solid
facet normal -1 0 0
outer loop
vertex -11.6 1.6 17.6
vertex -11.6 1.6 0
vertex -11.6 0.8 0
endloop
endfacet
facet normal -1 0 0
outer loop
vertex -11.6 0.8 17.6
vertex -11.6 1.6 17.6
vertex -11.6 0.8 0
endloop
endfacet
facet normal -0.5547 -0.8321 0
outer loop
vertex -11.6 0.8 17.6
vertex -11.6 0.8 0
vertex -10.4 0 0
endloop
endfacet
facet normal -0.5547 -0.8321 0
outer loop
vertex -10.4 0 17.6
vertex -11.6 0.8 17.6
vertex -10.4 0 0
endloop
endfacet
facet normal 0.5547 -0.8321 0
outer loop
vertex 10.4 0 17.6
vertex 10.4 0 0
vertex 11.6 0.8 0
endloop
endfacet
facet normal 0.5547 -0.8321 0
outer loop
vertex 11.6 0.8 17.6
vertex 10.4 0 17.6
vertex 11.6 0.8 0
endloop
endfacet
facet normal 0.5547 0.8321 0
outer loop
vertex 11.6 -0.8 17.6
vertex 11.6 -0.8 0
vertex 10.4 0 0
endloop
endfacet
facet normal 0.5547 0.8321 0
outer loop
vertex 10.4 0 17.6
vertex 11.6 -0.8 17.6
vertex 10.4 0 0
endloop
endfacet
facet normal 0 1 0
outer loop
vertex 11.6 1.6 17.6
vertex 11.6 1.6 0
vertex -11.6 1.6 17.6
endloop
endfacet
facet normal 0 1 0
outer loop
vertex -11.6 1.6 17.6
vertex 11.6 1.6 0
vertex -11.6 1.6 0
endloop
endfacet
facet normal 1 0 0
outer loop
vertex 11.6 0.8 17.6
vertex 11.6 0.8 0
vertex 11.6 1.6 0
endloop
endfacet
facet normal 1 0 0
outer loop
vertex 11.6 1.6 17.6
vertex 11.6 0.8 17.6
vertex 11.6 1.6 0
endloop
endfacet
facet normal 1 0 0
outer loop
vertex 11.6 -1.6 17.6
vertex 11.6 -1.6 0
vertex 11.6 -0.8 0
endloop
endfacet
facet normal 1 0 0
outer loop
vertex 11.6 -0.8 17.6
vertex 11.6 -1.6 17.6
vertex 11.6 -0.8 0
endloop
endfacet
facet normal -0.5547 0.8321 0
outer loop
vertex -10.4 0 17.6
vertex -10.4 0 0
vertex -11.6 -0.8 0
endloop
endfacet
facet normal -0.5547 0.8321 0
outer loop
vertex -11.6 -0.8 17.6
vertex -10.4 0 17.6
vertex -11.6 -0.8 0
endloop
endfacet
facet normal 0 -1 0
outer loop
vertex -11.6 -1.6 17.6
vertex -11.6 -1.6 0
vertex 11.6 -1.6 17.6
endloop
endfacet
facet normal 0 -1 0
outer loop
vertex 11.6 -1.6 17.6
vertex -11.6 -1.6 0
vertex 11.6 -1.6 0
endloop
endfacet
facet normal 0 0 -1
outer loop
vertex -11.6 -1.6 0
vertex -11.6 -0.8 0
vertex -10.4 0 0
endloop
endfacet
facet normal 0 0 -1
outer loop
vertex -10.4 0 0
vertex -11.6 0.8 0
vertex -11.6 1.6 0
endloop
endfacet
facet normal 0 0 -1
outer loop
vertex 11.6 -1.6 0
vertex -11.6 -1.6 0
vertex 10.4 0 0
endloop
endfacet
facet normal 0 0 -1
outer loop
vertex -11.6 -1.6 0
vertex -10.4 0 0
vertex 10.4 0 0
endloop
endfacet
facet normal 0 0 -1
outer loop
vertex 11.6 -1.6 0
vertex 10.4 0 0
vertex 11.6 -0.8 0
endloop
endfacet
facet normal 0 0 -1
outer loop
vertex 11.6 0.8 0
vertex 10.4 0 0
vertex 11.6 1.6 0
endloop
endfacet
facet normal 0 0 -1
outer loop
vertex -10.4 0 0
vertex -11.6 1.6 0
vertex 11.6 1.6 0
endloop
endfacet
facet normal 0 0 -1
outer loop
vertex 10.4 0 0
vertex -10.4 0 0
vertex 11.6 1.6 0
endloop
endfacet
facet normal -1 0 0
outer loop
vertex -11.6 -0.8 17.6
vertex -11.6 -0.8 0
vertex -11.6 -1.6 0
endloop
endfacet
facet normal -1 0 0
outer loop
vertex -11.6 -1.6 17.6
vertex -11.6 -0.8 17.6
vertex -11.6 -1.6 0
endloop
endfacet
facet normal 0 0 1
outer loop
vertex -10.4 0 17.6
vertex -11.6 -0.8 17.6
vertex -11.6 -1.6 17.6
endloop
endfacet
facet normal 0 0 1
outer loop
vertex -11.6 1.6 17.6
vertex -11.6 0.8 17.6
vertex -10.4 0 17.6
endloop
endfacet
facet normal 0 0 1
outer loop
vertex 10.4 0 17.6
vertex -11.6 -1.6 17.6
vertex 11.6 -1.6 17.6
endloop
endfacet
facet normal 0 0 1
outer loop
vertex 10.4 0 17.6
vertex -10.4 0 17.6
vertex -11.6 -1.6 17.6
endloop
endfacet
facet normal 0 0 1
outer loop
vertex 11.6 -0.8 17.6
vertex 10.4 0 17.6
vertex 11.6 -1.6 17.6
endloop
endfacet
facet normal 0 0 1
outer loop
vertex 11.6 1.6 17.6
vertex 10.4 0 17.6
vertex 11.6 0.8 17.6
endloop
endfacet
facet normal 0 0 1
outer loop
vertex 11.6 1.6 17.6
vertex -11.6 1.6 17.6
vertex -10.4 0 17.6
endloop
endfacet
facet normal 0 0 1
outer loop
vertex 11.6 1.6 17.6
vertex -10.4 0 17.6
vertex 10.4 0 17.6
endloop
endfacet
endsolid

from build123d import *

# Parameters (mm, degrees)
P_IDAT_VYSUNUT_M1_DEPTH = 17.6


with BuildPart() as part:
    # Skica2 → Přidat vysunutím1 (new body)
    with BuildSketch(Plane.XY):
        Polygon((0, 1.6), (0, -1.6), (11.6, -1.6), (11.6, -0.8), (10.4, 0), (11.6, 0.8), (11.6, 1.6), align=None)
        Polygon((-10.4, 0), (-11.6, -0.8), (-11.6, -1.6), (0, -1.6), (0, 1.6), (-11.6, 1.6), (-11.6, 0.8), align=None)
    extrude(amount=P_IDAT_VYSUNUT_M1_DEPTH)


solid = part.part
